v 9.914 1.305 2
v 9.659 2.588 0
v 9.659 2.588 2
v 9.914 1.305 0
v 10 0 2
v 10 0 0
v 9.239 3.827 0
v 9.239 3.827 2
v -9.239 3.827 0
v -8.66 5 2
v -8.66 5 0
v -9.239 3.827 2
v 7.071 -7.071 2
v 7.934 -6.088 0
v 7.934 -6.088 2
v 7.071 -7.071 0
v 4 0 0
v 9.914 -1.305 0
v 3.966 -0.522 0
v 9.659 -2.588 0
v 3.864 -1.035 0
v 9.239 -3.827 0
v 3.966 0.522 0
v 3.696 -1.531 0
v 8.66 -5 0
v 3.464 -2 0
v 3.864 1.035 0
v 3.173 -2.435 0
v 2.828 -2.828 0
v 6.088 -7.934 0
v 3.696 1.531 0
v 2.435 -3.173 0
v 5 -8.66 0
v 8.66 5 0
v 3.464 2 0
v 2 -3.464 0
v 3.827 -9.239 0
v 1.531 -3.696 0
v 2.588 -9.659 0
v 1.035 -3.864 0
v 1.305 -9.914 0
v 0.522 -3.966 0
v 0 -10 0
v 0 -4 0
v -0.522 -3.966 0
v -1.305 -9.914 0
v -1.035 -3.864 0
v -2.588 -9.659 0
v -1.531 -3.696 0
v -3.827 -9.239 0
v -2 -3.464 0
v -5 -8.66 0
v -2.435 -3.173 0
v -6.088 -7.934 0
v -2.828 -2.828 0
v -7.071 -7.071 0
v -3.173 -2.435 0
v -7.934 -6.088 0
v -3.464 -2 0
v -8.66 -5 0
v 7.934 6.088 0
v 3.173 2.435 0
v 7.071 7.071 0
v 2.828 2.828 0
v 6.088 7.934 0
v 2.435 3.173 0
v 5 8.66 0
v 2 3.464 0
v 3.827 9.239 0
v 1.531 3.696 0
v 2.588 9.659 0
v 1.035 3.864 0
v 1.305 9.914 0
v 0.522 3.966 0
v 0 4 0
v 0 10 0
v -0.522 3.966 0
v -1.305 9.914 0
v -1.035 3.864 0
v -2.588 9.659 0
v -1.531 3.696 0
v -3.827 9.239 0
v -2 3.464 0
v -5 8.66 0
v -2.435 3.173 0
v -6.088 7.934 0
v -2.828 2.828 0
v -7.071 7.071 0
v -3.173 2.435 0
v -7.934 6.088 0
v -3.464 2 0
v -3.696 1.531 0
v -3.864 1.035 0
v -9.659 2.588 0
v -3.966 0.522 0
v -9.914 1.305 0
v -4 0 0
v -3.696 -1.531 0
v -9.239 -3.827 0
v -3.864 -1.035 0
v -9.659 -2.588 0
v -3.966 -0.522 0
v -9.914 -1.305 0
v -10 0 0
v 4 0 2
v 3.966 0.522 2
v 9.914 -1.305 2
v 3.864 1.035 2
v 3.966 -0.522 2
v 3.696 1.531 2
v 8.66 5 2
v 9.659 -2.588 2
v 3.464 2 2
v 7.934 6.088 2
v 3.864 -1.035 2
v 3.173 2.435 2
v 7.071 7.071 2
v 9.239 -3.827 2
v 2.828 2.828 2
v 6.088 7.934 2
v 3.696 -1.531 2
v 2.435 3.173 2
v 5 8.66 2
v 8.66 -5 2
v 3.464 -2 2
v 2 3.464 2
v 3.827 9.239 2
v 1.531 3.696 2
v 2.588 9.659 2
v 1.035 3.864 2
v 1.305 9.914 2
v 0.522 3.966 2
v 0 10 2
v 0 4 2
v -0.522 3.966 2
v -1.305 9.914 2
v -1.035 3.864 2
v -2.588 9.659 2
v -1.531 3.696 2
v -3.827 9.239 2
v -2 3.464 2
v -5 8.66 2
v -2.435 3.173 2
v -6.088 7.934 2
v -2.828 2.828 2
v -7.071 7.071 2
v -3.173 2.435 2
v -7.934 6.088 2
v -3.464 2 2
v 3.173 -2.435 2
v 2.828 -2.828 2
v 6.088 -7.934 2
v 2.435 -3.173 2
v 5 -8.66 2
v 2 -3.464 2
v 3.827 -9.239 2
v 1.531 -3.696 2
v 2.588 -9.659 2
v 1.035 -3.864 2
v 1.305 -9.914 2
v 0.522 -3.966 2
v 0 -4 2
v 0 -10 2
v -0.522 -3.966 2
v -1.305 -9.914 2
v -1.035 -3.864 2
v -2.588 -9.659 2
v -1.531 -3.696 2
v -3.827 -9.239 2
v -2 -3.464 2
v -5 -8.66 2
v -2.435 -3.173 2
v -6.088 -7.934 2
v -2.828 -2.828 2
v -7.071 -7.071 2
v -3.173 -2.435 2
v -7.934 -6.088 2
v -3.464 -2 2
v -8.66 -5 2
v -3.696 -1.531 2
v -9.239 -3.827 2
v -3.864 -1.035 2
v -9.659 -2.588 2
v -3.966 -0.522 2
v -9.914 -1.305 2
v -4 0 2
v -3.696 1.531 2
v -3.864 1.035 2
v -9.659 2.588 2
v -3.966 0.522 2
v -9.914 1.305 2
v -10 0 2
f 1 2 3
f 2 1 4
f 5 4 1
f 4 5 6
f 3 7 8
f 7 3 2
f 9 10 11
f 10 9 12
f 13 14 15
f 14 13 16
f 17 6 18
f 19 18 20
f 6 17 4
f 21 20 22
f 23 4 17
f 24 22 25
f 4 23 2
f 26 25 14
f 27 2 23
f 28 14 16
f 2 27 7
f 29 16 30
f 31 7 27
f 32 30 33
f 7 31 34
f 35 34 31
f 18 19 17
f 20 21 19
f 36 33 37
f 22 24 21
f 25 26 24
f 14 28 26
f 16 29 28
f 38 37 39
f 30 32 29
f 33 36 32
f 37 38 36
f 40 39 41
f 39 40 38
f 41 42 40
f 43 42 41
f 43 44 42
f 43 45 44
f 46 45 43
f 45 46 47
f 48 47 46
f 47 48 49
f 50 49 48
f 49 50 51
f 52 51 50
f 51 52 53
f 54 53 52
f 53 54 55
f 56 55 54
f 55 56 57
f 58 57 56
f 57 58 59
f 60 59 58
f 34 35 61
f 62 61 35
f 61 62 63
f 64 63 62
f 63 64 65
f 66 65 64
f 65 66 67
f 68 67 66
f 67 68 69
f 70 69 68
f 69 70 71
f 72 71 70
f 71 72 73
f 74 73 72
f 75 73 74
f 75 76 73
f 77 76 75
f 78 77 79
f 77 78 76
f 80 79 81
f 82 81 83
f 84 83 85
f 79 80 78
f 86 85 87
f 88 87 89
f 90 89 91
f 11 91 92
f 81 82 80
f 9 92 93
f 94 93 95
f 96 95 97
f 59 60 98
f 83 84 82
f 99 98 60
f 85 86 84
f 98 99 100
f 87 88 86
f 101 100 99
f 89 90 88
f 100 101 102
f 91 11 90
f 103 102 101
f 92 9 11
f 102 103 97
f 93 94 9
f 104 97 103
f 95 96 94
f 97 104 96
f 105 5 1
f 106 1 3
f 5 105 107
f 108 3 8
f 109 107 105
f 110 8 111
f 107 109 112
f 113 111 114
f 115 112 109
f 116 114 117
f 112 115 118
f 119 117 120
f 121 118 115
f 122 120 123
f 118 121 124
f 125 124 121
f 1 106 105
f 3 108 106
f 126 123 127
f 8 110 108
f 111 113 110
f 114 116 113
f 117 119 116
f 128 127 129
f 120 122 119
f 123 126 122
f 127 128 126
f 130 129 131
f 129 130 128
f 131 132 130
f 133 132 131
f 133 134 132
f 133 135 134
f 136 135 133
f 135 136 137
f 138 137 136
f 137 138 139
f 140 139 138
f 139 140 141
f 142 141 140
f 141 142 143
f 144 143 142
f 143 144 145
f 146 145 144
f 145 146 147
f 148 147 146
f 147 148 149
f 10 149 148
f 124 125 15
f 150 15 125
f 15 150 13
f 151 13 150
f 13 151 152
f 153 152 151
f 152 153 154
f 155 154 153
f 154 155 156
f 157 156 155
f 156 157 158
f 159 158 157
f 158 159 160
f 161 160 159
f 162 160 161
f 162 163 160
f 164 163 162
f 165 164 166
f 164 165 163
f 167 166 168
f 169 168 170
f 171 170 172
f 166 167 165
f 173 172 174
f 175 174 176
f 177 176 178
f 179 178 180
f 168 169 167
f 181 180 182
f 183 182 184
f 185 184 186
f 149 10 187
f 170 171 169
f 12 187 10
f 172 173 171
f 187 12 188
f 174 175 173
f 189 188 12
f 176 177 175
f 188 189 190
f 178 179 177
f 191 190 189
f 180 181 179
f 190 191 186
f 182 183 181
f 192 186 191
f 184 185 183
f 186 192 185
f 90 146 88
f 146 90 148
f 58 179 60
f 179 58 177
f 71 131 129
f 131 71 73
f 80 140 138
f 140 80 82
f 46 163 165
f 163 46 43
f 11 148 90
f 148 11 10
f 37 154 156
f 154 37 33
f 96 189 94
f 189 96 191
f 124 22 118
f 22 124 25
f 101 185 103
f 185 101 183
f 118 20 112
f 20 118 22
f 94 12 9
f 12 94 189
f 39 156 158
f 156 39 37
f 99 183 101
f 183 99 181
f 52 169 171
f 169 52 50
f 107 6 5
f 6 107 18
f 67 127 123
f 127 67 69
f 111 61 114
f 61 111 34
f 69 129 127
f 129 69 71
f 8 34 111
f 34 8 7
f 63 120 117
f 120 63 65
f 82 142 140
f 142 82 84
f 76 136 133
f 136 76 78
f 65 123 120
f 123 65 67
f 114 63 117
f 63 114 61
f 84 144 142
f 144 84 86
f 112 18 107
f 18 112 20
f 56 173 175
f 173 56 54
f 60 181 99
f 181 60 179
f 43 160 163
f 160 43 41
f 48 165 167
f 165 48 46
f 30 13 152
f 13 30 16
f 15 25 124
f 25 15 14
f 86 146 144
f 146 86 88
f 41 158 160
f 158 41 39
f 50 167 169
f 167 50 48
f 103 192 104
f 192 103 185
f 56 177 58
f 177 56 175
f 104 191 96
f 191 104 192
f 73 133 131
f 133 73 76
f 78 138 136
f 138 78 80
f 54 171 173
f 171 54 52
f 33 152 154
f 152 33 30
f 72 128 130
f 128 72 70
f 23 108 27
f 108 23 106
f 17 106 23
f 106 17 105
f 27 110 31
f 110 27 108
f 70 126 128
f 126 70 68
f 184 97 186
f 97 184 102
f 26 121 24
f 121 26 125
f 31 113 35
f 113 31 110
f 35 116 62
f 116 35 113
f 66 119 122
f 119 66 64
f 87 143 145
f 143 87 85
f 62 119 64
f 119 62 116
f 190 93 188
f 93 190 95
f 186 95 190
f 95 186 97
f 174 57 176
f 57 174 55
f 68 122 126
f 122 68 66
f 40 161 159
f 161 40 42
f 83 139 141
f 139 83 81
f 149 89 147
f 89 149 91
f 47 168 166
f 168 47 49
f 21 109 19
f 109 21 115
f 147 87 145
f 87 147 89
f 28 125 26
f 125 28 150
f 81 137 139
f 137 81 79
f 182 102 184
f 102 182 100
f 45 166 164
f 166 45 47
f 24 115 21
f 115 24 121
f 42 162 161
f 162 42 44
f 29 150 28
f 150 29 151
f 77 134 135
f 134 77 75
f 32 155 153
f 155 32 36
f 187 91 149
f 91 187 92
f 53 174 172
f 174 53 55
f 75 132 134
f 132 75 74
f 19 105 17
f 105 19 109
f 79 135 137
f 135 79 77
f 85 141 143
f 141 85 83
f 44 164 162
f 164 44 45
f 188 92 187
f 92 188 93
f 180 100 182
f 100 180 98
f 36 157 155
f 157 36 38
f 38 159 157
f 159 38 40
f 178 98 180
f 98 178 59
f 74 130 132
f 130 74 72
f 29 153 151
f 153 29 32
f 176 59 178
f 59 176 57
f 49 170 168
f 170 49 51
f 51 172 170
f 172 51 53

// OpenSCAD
// Flat washer / spacer ring
outer_d = 20;
inner_d = 8;
thickness = 2;
$fn = 48;

difference() {
  cylinder(h = thickness, d = outer_d);
  translate([0, 0, -0.1])
    cylinder(h = thickness + 0.2, d = inner_d);
}
